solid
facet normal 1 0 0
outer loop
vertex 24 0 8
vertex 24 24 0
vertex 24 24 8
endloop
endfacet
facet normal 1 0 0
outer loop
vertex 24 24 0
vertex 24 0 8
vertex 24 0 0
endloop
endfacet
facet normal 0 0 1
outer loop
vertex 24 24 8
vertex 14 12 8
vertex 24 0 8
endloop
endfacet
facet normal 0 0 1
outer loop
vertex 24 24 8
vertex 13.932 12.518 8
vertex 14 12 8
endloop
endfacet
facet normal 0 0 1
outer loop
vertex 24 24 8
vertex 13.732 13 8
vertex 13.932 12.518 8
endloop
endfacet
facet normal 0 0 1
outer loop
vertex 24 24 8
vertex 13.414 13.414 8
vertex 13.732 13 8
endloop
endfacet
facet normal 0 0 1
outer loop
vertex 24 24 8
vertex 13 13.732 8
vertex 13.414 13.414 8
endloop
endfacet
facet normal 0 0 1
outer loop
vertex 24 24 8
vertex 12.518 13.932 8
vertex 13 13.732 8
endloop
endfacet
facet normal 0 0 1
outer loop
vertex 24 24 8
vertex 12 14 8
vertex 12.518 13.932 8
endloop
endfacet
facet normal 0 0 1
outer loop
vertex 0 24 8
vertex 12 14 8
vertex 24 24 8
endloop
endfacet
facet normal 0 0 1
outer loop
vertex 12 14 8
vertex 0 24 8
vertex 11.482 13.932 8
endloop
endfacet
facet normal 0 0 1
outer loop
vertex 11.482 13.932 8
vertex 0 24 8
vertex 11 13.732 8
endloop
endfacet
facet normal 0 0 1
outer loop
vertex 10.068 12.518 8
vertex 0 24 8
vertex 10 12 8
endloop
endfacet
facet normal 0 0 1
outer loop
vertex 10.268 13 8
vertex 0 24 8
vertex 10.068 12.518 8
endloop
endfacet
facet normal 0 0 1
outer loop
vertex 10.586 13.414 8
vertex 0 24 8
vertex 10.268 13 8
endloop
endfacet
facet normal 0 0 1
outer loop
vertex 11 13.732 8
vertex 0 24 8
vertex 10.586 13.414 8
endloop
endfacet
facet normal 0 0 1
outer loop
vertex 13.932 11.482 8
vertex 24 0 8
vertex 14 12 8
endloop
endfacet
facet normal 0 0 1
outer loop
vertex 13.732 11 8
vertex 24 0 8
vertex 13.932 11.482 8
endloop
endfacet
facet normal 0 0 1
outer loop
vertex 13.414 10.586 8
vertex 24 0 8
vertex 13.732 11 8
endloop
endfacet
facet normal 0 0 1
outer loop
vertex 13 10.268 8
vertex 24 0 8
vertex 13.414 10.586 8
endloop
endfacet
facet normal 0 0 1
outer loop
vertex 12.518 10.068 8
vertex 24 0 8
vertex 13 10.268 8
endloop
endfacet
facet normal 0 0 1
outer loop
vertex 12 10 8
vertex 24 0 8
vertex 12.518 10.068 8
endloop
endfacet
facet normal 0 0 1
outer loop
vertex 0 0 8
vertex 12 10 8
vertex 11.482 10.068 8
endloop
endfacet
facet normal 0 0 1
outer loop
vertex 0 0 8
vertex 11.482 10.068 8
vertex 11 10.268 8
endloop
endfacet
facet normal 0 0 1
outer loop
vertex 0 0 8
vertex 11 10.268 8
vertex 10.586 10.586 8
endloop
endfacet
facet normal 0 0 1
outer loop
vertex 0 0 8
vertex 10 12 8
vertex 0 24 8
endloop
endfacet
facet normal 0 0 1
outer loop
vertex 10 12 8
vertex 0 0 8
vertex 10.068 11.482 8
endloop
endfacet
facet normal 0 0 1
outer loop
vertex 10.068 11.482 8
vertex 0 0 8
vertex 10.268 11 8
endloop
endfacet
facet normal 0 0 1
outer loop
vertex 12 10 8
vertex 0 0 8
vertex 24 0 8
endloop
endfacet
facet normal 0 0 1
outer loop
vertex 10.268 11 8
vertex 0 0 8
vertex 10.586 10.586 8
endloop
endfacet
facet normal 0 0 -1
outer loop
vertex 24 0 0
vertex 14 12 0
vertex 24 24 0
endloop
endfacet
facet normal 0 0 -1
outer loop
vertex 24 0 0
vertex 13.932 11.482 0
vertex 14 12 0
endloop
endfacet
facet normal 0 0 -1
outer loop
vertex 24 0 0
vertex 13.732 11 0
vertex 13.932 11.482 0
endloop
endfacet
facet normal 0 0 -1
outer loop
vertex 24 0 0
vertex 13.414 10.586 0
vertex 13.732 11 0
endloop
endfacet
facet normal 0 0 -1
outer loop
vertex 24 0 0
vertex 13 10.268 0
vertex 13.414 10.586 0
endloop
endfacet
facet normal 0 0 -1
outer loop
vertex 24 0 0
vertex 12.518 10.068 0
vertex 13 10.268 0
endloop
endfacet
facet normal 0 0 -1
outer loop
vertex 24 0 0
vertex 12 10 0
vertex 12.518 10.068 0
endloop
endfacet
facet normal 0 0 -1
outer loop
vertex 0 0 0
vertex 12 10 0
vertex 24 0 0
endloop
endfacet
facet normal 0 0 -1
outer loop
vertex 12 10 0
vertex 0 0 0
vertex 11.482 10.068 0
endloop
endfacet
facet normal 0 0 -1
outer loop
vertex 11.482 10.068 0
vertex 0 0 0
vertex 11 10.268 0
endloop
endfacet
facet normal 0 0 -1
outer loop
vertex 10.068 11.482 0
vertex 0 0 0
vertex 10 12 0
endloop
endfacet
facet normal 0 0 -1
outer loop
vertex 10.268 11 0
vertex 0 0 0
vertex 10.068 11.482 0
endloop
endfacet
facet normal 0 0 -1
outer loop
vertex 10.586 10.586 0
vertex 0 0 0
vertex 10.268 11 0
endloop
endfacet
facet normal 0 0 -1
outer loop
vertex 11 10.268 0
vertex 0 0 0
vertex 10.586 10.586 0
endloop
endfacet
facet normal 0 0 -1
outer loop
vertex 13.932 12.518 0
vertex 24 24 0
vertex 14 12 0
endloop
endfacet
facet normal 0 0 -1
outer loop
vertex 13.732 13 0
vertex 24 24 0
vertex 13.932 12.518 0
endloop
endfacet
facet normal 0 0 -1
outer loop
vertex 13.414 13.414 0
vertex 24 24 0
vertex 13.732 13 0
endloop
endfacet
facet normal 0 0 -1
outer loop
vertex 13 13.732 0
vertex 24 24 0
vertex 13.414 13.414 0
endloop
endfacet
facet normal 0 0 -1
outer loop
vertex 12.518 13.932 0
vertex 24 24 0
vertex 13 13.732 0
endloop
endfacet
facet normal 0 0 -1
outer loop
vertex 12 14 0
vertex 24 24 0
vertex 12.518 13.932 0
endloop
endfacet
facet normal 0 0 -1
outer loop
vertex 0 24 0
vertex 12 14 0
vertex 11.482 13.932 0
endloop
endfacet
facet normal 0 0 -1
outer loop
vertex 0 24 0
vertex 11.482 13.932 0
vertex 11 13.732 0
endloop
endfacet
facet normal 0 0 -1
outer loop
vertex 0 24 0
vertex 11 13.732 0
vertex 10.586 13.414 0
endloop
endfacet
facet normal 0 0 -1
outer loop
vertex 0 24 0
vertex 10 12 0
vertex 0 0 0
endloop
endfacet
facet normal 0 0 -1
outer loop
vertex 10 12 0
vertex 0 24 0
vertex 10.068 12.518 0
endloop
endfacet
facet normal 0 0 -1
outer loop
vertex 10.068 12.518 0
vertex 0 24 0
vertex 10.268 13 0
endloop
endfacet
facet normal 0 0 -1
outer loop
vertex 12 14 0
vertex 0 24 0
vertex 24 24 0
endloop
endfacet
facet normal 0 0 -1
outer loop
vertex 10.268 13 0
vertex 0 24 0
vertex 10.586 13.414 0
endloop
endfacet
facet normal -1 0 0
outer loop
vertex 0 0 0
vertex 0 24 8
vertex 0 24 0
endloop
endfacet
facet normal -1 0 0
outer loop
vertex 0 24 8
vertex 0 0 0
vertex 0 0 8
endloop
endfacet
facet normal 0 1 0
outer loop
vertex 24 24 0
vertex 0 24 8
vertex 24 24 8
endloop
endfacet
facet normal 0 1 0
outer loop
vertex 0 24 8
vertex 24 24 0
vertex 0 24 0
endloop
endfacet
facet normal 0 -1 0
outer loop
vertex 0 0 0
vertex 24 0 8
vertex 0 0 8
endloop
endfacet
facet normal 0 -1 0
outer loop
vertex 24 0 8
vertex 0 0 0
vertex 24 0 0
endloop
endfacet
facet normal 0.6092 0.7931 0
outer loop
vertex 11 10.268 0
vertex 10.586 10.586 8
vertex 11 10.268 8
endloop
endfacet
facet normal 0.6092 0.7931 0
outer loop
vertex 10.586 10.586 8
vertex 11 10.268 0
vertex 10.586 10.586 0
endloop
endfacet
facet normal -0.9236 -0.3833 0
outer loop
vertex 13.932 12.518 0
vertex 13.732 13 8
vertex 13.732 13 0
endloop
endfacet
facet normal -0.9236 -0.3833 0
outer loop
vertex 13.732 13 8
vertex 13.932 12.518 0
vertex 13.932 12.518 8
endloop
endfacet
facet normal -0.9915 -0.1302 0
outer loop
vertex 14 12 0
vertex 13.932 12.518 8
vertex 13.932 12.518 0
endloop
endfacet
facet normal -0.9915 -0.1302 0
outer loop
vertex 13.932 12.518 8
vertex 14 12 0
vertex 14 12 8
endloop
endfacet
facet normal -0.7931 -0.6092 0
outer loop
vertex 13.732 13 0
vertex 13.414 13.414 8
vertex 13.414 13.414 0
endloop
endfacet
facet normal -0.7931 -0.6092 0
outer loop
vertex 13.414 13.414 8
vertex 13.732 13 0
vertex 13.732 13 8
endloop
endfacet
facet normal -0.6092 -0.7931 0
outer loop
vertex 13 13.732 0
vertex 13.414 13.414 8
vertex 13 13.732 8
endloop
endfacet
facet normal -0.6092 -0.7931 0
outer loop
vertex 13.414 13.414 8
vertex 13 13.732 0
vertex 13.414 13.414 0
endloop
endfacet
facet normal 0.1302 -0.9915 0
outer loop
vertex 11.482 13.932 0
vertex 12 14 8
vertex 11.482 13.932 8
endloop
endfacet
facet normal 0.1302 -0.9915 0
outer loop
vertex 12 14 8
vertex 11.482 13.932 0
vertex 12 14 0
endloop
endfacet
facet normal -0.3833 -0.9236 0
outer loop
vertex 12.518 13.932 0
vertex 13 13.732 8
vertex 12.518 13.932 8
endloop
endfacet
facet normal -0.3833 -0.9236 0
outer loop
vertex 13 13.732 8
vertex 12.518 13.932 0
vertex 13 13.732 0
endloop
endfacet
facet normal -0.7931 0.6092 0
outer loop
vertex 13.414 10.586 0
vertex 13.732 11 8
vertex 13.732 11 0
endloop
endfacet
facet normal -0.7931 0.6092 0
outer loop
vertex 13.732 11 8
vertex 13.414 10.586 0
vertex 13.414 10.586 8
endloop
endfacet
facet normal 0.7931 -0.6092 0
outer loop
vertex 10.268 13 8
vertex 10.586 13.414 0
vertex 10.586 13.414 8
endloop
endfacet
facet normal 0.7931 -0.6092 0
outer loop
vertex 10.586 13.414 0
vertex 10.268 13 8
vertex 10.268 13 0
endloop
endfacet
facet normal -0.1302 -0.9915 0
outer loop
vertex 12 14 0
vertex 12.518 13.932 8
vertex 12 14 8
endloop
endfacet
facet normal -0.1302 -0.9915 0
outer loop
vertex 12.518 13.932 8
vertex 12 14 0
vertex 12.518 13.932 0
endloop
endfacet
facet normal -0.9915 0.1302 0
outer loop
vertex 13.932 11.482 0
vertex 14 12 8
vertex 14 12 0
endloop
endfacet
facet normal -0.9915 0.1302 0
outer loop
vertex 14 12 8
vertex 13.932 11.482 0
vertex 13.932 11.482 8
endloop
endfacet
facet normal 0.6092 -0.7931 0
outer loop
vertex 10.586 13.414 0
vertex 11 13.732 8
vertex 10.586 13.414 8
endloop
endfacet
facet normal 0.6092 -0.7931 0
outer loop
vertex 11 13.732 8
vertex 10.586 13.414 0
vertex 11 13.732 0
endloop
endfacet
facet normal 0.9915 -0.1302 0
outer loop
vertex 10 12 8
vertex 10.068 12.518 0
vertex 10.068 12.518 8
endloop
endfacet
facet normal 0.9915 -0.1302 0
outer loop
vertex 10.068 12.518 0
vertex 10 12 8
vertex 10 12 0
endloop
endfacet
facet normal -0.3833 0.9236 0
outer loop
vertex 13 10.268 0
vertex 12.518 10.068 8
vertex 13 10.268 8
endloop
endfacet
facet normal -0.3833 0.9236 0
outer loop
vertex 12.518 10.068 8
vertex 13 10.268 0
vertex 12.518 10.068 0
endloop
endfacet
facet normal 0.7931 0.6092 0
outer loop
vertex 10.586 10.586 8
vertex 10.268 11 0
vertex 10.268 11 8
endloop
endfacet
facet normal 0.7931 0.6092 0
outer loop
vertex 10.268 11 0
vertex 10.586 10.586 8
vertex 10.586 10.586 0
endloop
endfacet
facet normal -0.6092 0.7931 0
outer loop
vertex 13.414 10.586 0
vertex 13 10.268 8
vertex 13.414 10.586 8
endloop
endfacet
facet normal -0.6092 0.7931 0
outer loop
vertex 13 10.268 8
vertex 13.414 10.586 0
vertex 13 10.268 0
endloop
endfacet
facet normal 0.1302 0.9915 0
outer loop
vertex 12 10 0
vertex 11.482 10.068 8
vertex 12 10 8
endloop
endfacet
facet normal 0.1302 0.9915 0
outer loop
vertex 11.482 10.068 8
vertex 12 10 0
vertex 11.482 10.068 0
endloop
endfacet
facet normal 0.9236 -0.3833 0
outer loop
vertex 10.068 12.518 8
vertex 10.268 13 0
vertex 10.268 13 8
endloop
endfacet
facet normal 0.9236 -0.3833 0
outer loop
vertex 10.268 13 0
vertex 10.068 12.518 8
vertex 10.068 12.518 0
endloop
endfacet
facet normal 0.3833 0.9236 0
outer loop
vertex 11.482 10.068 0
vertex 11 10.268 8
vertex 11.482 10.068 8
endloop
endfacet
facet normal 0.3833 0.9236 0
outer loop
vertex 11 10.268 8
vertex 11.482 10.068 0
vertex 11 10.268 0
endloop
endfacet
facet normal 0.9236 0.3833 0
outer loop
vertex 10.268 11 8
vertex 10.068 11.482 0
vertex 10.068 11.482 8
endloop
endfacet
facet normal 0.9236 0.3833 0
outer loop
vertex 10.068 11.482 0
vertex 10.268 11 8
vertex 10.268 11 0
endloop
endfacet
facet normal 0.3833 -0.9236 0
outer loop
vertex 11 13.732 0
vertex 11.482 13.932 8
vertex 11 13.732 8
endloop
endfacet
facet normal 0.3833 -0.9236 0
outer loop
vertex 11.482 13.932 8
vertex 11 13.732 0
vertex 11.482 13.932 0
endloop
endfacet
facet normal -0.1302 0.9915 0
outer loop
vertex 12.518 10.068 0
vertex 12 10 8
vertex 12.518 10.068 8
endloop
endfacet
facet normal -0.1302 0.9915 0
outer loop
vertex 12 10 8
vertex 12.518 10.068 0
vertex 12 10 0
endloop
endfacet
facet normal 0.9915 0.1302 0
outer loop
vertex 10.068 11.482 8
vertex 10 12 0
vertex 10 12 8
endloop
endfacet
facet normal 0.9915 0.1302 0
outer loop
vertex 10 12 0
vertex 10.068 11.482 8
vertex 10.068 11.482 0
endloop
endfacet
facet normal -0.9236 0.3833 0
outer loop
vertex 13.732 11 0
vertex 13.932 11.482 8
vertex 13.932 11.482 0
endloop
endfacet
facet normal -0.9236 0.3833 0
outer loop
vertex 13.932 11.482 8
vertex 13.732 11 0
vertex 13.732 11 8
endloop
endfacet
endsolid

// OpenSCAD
$fn=24;
difference(){cube([24,24,8]);translate([12,12,-1])cylinder(h=10,r=2);}
